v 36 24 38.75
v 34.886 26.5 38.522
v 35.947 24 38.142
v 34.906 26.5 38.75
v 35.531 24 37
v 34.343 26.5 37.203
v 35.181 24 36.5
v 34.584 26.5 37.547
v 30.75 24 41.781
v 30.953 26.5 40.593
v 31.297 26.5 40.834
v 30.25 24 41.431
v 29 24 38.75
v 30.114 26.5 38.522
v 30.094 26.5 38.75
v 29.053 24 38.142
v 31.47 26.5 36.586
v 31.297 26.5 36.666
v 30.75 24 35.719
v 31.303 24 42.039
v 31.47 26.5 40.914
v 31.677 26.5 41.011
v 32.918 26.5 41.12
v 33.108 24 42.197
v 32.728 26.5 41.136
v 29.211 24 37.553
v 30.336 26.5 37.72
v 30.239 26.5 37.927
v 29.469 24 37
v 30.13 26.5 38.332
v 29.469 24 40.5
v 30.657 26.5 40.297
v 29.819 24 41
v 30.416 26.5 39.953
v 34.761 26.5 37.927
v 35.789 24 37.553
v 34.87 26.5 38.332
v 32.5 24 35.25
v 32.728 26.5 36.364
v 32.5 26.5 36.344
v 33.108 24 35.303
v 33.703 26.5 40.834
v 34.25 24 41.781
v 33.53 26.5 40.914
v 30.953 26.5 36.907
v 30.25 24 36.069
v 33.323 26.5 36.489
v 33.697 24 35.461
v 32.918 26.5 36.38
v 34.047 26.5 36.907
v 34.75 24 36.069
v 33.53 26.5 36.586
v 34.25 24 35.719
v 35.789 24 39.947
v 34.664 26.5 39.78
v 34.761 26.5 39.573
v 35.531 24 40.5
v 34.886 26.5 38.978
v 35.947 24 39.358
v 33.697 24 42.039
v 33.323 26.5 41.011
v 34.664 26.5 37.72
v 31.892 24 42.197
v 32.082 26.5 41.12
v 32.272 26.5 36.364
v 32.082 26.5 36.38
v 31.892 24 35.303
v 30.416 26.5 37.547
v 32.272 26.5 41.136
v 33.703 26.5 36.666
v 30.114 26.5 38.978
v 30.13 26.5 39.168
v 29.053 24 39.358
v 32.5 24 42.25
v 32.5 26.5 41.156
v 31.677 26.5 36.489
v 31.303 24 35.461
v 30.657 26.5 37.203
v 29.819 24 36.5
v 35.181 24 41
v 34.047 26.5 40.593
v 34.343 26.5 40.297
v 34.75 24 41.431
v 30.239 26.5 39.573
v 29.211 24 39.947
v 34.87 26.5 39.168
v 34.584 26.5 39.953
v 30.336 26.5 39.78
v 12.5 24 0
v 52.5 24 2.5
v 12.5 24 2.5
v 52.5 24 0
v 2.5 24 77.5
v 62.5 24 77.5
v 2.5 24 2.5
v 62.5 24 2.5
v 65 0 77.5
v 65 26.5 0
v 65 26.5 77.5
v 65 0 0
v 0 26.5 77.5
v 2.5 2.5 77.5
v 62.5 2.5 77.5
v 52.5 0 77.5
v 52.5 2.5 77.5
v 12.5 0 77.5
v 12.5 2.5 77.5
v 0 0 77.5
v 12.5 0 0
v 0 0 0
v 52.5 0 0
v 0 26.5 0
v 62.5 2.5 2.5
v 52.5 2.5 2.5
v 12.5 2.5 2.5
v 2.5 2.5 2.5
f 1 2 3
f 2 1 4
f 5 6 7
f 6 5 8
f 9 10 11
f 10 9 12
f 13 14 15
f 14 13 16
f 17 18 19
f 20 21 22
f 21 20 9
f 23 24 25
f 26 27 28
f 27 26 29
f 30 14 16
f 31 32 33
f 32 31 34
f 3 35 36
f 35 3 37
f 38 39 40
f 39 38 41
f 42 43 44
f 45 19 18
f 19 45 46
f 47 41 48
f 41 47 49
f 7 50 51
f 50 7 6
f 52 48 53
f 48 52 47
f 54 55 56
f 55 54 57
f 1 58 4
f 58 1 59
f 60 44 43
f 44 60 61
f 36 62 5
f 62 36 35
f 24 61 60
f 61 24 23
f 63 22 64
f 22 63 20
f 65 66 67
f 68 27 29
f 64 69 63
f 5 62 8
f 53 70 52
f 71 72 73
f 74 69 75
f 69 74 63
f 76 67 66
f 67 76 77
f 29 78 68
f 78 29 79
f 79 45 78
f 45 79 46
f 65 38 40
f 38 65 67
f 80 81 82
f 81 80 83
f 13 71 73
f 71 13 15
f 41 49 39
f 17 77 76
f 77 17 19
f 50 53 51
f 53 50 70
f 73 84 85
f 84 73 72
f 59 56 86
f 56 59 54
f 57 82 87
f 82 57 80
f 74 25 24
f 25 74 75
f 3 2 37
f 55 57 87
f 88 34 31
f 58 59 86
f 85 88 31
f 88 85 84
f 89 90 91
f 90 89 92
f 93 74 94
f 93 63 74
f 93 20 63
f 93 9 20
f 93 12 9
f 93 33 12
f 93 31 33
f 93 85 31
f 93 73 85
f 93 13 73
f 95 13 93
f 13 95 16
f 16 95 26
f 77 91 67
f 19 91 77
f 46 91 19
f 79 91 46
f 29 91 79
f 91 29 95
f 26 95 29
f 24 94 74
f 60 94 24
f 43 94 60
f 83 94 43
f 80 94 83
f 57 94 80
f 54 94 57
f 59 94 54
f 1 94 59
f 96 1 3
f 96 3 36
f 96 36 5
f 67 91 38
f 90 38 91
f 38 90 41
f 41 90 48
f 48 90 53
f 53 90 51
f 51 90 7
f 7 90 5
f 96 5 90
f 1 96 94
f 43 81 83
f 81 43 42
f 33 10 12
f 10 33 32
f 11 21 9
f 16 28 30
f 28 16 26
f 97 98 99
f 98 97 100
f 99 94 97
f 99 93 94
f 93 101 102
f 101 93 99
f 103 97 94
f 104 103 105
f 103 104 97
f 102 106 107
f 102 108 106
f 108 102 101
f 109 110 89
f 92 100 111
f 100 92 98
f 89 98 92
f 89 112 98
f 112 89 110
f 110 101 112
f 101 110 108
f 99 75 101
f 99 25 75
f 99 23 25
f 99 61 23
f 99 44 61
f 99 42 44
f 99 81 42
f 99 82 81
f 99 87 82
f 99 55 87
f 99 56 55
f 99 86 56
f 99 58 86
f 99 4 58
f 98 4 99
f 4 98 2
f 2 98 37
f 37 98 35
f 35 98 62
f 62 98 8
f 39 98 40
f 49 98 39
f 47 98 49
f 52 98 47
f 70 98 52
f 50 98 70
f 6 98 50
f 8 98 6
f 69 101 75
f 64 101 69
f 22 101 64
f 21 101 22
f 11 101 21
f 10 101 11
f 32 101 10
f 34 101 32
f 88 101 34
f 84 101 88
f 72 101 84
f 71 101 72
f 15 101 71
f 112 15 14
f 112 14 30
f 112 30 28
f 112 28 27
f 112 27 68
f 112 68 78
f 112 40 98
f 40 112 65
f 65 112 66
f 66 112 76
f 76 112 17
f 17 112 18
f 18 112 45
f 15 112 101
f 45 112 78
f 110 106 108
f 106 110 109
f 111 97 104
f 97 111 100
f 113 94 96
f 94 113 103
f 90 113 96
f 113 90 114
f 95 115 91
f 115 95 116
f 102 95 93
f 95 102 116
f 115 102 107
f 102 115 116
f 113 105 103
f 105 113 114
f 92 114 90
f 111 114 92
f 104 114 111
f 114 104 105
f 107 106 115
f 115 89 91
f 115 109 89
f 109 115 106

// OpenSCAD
// file: Schraube.scad
$fn=36;

//Tickness
t=1.4;

/* Copy from here */

//Schraube oben durchmesser
//sod=5;
sod=7;
//Schraube unten durchmesser
//sud=2;
sud=3.5;
//Schraubenkopflänge
skl=4;
//Schraube Total
st=16.5;
//

module Schraube()
{
    color("red")
    translate([0,0,0])
    rotate([0,0,0])
    {
        cylinder(skl, d1=sod,d2=sud);
        cylinder(st, d=sud);
    }
}

//schraube();
// main file
//Universal Remote Control Holder
//UniversalRemoteControlHolder.scad

include <Schraube.scad>

w=60;
d=21.5;
h=75;

t=2.5;

//Front left and right
f=10;

module outercube()
{
    cube([w+t+t,d+t+t,h+t]);
}

//outercube();

module innercube()
{
    cube([w,d,h]);
}

module frontslot()
{
    cube([w-f-f,t+d,h+t]);
}

module schraube()
{
    translate([(w+t+t)/2,t+d,(h+t)/2])
    rotate([270,0,0])
    Schraube();
}

difference()
{
    outercube();
    
    translate([t,t,t])
    innercube();
    
    translate([t+f,0,0])
    frontslot();
    
    schraube();
}
